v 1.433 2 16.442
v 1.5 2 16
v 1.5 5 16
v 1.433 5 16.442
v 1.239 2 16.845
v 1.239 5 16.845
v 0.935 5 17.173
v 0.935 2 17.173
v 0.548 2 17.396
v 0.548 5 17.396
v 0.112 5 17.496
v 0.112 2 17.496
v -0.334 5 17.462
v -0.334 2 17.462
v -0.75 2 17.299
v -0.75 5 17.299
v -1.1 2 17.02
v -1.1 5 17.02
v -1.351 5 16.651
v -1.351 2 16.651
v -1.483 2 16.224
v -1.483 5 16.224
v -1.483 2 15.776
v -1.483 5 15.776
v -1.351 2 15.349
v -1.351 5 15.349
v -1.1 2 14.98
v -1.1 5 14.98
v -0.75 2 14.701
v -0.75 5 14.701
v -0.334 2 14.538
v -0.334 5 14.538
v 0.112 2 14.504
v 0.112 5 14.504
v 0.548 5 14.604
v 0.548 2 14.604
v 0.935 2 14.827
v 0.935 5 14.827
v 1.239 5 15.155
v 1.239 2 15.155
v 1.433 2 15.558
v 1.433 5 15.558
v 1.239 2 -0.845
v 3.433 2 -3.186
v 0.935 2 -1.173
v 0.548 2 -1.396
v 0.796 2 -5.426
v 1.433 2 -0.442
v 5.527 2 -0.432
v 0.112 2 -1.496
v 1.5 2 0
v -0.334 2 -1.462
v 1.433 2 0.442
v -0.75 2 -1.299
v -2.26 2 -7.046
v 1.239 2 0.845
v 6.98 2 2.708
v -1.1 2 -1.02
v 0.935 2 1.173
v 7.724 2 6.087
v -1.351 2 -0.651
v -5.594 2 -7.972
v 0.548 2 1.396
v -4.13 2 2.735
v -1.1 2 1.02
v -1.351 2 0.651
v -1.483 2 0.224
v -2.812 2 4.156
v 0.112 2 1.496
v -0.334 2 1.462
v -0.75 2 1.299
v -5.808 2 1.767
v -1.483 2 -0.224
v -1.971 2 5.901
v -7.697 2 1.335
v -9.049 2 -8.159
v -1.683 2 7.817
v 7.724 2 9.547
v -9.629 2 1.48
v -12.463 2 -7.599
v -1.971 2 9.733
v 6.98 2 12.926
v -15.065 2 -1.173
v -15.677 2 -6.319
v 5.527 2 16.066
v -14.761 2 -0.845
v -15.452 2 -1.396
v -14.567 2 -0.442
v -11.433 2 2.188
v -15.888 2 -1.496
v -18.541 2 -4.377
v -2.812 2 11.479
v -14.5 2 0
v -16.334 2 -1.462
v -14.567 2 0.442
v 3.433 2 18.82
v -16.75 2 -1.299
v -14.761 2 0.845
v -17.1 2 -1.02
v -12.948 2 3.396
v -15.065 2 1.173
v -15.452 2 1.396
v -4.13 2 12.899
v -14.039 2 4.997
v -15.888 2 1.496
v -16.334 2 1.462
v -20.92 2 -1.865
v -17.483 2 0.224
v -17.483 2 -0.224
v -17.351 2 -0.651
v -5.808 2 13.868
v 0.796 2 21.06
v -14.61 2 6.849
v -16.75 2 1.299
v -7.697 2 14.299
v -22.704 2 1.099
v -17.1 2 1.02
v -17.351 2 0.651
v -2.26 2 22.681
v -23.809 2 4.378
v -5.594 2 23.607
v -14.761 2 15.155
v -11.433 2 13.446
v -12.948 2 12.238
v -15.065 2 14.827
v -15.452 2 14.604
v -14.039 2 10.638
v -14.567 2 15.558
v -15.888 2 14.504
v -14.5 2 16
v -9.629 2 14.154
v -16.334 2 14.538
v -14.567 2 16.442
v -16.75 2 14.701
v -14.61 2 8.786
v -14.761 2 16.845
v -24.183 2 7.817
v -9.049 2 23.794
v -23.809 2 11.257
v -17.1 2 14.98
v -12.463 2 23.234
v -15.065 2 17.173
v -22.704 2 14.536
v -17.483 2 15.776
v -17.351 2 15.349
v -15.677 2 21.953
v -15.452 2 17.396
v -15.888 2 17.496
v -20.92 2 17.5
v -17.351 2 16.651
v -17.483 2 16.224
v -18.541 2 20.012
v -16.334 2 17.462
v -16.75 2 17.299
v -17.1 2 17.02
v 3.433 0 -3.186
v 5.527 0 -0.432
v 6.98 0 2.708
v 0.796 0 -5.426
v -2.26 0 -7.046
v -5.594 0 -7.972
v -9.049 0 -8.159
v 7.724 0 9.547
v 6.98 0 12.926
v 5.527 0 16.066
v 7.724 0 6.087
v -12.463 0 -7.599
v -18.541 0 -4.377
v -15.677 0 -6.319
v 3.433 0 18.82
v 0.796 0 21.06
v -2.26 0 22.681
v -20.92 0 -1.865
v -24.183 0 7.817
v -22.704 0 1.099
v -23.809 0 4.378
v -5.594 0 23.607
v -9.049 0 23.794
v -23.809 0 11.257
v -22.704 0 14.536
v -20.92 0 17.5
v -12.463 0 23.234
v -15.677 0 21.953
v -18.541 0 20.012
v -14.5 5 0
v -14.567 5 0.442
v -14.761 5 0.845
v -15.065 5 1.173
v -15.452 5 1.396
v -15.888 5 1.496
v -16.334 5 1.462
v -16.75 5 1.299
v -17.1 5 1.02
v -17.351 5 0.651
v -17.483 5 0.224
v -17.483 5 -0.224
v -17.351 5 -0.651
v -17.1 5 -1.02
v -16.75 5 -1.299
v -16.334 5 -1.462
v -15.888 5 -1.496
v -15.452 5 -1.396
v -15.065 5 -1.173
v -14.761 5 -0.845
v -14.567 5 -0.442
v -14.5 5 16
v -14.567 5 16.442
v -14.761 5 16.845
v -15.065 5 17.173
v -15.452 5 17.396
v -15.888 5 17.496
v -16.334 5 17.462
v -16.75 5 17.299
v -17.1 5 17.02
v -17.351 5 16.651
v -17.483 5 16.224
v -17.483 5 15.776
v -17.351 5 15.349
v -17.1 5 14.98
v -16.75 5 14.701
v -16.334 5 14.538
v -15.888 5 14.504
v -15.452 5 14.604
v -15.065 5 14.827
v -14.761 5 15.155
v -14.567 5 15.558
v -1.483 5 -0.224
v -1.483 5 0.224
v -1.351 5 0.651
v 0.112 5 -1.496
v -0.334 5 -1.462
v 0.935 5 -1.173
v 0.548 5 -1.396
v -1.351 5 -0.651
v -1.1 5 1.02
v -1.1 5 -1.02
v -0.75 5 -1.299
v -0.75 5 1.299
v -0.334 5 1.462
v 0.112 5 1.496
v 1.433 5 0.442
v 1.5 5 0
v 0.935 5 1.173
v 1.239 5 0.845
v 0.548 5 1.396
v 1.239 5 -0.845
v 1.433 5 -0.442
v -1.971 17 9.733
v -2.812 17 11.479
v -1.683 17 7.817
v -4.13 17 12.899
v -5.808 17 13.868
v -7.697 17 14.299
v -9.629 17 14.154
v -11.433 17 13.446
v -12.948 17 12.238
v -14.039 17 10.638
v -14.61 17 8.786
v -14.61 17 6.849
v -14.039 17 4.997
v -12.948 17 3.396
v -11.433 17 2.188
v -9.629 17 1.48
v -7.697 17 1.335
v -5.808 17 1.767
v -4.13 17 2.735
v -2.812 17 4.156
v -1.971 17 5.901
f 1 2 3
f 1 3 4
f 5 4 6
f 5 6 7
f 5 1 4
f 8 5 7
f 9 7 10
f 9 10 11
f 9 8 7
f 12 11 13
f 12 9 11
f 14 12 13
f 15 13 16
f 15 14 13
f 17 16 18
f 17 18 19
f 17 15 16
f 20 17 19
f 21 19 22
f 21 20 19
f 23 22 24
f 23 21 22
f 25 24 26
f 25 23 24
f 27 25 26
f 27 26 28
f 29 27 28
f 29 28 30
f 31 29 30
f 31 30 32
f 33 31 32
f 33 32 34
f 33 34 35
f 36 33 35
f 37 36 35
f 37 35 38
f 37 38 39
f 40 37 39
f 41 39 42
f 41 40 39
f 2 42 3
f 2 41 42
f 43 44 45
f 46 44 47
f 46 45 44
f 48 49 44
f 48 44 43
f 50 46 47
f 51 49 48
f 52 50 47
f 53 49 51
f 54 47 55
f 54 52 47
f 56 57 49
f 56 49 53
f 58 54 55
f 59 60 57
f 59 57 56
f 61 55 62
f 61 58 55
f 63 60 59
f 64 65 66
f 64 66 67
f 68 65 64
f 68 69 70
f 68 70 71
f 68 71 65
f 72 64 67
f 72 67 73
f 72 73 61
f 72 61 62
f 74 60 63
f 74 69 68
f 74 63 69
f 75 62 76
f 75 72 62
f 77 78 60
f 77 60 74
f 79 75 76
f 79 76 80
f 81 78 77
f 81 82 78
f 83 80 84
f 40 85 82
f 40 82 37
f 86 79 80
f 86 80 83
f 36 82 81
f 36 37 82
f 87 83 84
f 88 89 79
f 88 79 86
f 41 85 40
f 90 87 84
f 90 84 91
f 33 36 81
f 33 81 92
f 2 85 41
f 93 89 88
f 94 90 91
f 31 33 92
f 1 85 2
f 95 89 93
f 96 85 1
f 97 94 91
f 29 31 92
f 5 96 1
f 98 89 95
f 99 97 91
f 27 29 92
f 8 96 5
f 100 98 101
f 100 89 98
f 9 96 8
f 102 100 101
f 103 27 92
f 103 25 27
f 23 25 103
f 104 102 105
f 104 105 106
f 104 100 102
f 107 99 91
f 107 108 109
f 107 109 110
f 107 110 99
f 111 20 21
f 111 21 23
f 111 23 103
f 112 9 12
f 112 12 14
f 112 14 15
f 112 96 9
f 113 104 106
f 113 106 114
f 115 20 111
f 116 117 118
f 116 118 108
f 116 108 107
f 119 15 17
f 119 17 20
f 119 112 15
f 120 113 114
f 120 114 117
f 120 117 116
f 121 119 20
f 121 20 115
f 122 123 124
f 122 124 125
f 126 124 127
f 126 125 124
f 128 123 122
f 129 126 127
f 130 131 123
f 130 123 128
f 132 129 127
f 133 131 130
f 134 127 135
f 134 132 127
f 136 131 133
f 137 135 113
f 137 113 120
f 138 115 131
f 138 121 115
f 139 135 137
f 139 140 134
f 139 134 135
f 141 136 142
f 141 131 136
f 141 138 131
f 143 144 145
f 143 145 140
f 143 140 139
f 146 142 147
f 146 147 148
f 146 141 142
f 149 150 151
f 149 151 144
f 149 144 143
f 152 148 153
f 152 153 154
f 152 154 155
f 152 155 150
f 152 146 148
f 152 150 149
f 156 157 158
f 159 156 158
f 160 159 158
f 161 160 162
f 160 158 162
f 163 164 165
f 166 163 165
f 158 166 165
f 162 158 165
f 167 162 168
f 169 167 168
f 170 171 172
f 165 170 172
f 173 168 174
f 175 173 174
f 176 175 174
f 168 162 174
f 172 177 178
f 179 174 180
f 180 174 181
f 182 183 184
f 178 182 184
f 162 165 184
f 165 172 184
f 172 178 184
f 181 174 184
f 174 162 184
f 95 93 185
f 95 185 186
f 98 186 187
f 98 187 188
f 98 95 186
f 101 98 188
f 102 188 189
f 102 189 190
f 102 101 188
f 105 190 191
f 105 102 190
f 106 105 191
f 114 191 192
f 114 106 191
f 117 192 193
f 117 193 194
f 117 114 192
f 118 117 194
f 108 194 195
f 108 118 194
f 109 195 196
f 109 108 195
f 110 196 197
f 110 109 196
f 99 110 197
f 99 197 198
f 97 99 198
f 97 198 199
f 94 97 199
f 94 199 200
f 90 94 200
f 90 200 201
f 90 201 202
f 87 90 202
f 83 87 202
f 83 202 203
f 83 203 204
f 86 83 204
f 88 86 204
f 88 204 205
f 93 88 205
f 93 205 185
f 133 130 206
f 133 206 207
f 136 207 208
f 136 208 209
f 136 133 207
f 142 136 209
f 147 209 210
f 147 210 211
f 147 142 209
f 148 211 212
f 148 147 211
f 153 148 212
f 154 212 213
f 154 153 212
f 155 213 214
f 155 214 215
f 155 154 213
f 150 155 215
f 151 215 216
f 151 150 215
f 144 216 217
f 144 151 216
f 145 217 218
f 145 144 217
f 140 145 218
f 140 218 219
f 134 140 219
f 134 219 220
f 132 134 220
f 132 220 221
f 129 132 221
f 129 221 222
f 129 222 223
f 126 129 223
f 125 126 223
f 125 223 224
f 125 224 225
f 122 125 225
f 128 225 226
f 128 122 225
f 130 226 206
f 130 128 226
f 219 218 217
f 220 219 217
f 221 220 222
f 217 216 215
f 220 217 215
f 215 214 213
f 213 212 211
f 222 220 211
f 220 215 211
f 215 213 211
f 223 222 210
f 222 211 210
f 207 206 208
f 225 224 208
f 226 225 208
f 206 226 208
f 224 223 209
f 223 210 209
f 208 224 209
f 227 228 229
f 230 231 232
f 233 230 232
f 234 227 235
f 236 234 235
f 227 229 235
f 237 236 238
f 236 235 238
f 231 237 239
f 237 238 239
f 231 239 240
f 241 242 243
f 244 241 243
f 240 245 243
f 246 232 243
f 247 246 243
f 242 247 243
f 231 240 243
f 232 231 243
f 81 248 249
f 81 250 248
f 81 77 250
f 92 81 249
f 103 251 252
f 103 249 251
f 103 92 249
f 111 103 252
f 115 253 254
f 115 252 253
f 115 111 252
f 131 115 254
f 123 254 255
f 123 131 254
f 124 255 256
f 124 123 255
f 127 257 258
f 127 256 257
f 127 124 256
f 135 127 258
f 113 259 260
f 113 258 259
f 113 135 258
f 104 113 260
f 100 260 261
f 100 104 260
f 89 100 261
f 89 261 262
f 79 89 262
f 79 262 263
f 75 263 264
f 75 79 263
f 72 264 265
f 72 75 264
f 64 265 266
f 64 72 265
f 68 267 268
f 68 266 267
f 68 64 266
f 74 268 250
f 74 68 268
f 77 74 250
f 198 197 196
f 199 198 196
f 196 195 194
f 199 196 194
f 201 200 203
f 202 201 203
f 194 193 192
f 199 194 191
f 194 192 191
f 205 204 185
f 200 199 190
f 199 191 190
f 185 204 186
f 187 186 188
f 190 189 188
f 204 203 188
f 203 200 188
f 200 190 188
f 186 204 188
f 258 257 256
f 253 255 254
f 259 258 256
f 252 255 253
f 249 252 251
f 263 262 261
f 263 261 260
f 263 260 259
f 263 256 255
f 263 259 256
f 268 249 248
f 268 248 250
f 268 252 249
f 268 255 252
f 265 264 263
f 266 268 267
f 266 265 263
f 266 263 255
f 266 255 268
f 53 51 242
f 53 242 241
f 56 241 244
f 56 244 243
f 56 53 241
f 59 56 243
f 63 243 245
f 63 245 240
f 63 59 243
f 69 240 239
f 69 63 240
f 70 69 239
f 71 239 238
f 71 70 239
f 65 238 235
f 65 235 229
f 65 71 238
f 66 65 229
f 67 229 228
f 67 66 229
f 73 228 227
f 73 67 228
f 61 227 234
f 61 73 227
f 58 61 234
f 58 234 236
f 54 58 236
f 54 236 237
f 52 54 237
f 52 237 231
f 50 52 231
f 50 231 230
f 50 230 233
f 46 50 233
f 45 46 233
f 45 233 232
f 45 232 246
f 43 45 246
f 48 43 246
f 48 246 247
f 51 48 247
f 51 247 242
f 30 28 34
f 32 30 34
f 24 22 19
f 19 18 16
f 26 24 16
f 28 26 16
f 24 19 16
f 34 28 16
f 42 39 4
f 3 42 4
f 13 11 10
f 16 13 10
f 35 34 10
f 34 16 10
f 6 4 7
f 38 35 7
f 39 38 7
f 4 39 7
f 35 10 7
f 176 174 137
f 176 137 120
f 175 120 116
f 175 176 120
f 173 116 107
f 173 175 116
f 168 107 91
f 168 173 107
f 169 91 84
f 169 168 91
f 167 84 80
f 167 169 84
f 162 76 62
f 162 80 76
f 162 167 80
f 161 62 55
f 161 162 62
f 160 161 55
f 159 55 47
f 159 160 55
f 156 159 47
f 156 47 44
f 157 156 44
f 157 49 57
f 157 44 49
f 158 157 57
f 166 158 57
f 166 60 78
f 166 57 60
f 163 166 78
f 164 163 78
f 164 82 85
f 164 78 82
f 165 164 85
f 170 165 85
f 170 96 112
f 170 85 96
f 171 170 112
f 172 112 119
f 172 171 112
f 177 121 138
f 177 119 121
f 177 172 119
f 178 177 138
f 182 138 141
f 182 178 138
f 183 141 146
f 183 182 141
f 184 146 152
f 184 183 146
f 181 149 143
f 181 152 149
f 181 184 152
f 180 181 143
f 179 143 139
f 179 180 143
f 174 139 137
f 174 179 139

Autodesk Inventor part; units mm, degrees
ref_plane "YZ Plane" through (0, 0, 0) normal (1, 0, 0) x (0, 1, 0)
ref_plane "XZ Plane" through (0, 0, 0) normal (0, 1, 0) x (-1, 0, 0)
ref_plane "XY Plane" through (0, 0, 0) normal (0, 0, 1) x (1, 0, 0)
sketch "Boceto1" plane through (0, 0, 0) normal (0, 1, 0) x (-1, 0, 0)
  line L0 (0, 0) -> (0, 16)
  line L1 (0, 16) -> (16, 16)
  line L2 (16, 16) -> (16, 0)
  line L3 (16, 0) -> (0, 0)
  line L4 (0, 16) -> (16, 0)
  circle A0 centre (8, 8) radius 11.3137
  circle A1 centre (16, 16) radius 1.5
  circle A2 centre (0, 16) radius 1.5
  circle A3 centre (0, 0) radius 1.5
  circle A4 centre (16, 0) radius 1.5
  circle A5 centre (8.1827, 7.8173) radius 16
  dimension "d0" = 16
  dimension "d1" = 16
  dimension "d2" = 3
  dimension "d5" = 360
  dimension "d7" = 32
extrude "Extrusión1" add sketch "Boceto1" along normal blind 2 contours A3 A0 A2 L0 | L0 A2 L4 A4 L3 A3 | L3 A4 A0 A3 | A2 L1 A1 L2 A4 L4 | A0 A1 L1 A2 | L2 A1 A0 A4 | A5
sketch "Boceto2" plane through (-8.1827, 2, 7.8173) normal (0, 1, 0) x (1, 0, 0)
  point P0 (8.1827, 7.8173)
sketch "Boceto3" plane through (-8.1827, 2, 7.8173) normal (0, 1, 0) x (1, 0, 0)
  circle A0 centre (0, 0) radius 6.5
  point P0 (8.1827, 7.8173)
  dimension "d10" = 13
extrude "Extrusión2" add sketch "Boceto3" along normal blind 15
sketch "Boceto4" plane through (-8.1827, 0, 7.8173) normal (0, -1, 0) x (1, 0, 0)
  circle A0 centre (8.1827, 8.1827) radius 1.5 projected
  circle A1 centre (8.1827, 8.1827) radius 1.5
  circle A2 centre (8.1827, -7.8173) radius 1.5 projected
  circle A3 centre (8.1827, -7.8173) radius 1.5
  circle A4 centre (-7.8173, -7.8173) radius 1.5 projected
  circle A5 centre (-7.8173, -7.8173) radius 1.5
  circle A6 centre (-7.8173, 8.1827) radius 1.5 projected
  circle A7 centre (-7.8173, 8.1827) radius 1.5
  point P0 (8.1827, -7.8173)
extrude "Extrusión3" add sketch "Boceto4" against normal blind 5
properties part number "brazo_2_contra"
